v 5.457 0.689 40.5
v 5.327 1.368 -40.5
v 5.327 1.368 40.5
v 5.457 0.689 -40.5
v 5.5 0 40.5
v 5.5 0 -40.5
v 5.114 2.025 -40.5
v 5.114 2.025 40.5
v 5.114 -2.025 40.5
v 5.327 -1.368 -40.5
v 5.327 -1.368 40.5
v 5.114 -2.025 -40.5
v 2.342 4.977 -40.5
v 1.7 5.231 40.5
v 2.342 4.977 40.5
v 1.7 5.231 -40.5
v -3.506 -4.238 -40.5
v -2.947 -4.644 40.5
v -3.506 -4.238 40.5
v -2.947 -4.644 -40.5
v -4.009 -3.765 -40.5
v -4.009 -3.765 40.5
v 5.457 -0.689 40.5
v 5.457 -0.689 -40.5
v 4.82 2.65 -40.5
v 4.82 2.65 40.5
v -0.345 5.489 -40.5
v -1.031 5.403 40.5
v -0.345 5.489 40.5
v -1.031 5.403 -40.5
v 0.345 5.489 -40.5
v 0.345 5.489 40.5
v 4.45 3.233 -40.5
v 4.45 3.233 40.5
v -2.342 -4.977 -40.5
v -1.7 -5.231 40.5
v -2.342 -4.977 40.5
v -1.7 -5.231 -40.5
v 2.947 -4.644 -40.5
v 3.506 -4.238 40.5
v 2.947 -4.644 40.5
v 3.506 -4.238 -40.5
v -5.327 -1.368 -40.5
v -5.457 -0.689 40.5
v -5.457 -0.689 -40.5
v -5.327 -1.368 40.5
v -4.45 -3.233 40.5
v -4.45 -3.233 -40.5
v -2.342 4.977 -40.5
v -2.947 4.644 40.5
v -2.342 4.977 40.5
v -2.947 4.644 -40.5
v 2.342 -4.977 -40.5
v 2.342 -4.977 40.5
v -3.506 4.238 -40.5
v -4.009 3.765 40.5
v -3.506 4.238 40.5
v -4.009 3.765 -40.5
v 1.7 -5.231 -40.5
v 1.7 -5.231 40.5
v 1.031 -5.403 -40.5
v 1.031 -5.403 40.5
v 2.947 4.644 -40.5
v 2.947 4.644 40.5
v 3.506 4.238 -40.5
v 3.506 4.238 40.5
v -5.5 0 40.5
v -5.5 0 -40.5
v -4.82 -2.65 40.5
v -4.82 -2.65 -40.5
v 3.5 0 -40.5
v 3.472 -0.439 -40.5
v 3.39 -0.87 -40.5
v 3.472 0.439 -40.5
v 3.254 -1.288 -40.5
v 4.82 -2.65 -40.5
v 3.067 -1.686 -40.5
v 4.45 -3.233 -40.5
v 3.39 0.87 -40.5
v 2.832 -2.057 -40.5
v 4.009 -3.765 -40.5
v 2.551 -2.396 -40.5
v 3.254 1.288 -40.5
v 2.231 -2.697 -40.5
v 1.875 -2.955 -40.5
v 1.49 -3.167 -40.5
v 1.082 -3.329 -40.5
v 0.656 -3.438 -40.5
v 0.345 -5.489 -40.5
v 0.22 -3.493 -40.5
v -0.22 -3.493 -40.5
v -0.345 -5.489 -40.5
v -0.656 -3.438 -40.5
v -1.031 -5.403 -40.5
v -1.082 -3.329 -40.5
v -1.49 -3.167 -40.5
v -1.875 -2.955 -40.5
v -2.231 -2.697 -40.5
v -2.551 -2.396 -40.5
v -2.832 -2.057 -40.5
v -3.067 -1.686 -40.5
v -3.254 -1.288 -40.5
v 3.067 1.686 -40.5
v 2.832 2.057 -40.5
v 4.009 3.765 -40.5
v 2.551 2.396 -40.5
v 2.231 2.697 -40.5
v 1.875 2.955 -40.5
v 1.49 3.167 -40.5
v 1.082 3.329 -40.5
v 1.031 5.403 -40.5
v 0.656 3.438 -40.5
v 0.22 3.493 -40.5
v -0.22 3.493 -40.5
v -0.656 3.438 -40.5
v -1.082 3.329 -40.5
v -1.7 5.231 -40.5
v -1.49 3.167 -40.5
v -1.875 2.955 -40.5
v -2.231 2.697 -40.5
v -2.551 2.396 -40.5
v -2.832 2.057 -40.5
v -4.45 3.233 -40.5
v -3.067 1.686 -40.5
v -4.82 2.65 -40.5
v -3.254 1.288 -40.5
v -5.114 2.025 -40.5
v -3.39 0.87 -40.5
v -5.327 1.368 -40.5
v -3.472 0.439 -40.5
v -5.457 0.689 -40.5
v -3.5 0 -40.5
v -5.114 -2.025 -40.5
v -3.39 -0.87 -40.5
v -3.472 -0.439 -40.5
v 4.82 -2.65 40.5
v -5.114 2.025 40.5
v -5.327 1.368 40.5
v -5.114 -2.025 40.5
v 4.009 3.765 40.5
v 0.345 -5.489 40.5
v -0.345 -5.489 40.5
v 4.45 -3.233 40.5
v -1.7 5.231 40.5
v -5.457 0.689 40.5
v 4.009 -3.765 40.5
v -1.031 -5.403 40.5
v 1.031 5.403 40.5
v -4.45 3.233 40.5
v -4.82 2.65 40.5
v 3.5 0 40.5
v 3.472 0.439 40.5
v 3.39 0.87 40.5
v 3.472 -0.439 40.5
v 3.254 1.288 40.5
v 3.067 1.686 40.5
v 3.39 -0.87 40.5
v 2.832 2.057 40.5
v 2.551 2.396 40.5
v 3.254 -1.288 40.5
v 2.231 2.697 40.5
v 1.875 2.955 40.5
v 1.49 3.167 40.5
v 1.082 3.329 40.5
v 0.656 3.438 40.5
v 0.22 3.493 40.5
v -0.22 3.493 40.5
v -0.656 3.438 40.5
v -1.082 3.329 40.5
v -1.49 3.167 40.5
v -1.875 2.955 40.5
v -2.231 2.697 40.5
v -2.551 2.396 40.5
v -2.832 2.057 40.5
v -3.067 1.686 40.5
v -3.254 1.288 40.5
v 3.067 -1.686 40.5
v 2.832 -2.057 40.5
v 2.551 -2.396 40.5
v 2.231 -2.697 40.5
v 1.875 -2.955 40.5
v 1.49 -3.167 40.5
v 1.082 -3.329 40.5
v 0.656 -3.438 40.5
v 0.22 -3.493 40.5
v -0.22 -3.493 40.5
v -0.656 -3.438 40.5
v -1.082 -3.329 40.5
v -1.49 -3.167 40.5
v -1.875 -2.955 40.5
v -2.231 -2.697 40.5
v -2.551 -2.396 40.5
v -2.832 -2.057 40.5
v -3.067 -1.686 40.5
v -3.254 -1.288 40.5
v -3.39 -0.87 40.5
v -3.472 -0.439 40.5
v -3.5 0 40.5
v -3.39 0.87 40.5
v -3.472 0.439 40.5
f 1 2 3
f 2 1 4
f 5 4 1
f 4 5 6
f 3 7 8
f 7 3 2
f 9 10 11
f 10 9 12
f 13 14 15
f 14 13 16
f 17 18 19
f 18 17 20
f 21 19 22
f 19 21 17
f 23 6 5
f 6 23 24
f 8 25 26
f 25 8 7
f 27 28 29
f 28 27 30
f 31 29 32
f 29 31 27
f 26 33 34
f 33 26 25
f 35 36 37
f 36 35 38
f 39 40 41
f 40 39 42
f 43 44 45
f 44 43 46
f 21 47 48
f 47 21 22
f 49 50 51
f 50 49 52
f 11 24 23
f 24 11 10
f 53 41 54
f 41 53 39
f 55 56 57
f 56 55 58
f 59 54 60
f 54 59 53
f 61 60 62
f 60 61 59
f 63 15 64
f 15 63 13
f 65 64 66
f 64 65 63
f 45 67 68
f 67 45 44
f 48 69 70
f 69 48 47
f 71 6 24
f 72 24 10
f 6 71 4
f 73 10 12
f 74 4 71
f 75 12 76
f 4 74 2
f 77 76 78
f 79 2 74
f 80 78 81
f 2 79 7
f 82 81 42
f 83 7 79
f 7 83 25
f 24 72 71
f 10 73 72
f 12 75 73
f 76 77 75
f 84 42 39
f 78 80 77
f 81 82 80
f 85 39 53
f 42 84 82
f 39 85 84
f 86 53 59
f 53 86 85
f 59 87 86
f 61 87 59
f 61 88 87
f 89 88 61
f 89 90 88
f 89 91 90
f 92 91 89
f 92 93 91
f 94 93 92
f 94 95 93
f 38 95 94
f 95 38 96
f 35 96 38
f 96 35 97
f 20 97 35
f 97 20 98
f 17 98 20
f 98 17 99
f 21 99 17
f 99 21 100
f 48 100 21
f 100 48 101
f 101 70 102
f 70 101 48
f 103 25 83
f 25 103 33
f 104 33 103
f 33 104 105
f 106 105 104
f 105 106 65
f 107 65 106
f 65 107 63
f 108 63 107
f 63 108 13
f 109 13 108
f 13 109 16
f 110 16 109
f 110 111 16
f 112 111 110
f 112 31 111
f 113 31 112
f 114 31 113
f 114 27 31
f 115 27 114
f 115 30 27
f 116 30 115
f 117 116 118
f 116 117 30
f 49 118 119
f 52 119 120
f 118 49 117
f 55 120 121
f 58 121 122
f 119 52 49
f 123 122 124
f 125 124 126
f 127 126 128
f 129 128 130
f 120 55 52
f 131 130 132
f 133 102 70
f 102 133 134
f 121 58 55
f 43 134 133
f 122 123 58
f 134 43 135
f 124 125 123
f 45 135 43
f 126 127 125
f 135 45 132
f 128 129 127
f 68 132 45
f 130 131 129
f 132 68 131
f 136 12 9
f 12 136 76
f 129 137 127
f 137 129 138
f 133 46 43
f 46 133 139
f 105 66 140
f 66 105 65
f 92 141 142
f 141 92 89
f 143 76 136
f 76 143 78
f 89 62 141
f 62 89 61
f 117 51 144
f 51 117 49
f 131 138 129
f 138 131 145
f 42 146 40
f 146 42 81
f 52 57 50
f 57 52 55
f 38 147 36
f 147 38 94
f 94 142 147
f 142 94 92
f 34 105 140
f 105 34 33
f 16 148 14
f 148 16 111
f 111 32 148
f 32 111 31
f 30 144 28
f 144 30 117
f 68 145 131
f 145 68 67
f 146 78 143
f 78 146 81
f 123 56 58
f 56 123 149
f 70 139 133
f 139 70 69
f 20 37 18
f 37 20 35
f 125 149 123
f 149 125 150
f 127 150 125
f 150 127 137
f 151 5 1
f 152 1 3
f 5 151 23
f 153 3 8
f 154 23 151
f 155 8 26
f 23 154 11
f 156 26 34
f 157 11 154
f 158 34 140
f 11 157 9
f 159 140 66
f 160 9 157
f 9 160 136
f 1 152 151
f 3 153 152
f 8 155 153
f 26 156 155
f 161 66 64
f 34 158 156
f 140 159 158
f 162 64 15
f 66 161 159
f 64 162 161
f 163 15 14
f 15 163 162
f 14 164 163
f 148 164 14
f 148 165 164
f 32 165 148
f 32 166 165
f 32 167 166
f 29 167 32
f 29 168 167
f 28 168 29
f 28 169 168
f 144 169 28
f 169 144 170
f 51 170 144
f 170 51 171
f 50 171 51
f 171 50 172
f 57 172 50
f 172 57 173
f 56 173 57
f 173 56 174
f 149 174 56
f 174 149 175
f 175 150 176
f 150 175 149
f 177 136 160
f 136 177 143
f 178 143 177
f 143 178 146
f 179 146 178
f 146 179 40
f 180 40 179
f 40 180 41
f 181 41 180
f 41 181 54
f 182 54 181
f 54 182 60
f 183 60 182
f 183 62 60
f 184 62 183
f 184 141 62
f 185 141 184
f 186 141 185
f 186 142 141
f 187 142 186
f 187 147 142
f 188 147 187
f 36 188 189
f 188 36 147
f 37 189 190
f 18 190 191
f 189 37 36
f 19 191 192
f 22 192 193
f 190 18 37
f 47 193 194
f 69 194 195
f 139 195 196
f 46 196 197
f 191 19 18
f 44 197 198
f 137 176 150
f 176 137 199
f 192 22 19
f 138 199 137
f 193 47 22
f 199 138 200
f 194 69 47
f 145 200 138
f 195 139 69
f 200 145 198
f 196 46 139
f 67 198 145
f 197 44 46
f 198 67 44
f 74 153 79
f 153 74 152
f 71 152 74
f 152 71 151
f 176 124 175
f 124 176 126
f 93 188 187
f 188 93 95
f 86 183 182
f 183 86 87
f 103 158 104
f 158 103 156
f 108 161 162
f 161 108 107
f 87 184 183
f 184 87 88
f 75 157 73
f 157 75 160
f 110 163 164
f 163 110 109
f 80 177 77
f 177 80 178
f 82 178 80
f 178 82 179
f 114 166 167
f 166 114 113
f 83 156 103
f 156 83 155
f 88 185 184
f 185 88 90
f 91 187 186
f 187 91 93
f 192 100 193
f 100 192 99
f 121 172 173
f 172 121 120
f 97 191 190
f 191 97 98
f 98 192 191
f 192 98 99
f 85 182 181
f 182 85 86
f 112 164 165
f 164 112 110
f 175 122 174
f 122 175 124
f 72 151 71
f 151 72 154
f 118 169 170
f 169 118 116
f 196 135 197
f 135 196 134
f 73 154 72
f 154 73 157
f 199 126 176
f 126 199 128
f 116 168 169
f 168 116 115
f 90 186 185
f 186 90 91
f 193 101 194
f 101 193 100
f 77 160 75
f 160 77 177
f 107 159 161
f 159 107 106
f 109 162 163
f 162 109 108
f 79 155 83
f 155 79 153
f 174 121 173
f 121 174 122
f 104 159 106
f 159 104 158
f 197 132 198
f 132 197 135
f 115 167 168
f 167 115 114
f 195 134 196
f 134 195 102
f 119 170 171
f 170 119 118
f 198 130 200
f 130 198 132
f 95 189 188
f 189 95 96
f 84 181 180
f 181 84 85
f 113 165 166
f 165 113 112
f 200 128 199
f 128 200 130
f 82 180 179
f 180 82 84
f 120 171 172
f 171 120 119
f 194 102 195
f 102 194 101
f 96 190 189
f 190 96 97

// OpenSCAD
$fn = 50;


difference() {
	union() {
		translate(v = [0, 0, -40.5000000000]) {
			cylinder(h = 81, r = 5.5000000000);
		}
	}
	union() {
		translate(v = [0, 0, -100.0000000000]) {
			cylinder(h = 200, r = 3.5000000000);
		}
	}
}
